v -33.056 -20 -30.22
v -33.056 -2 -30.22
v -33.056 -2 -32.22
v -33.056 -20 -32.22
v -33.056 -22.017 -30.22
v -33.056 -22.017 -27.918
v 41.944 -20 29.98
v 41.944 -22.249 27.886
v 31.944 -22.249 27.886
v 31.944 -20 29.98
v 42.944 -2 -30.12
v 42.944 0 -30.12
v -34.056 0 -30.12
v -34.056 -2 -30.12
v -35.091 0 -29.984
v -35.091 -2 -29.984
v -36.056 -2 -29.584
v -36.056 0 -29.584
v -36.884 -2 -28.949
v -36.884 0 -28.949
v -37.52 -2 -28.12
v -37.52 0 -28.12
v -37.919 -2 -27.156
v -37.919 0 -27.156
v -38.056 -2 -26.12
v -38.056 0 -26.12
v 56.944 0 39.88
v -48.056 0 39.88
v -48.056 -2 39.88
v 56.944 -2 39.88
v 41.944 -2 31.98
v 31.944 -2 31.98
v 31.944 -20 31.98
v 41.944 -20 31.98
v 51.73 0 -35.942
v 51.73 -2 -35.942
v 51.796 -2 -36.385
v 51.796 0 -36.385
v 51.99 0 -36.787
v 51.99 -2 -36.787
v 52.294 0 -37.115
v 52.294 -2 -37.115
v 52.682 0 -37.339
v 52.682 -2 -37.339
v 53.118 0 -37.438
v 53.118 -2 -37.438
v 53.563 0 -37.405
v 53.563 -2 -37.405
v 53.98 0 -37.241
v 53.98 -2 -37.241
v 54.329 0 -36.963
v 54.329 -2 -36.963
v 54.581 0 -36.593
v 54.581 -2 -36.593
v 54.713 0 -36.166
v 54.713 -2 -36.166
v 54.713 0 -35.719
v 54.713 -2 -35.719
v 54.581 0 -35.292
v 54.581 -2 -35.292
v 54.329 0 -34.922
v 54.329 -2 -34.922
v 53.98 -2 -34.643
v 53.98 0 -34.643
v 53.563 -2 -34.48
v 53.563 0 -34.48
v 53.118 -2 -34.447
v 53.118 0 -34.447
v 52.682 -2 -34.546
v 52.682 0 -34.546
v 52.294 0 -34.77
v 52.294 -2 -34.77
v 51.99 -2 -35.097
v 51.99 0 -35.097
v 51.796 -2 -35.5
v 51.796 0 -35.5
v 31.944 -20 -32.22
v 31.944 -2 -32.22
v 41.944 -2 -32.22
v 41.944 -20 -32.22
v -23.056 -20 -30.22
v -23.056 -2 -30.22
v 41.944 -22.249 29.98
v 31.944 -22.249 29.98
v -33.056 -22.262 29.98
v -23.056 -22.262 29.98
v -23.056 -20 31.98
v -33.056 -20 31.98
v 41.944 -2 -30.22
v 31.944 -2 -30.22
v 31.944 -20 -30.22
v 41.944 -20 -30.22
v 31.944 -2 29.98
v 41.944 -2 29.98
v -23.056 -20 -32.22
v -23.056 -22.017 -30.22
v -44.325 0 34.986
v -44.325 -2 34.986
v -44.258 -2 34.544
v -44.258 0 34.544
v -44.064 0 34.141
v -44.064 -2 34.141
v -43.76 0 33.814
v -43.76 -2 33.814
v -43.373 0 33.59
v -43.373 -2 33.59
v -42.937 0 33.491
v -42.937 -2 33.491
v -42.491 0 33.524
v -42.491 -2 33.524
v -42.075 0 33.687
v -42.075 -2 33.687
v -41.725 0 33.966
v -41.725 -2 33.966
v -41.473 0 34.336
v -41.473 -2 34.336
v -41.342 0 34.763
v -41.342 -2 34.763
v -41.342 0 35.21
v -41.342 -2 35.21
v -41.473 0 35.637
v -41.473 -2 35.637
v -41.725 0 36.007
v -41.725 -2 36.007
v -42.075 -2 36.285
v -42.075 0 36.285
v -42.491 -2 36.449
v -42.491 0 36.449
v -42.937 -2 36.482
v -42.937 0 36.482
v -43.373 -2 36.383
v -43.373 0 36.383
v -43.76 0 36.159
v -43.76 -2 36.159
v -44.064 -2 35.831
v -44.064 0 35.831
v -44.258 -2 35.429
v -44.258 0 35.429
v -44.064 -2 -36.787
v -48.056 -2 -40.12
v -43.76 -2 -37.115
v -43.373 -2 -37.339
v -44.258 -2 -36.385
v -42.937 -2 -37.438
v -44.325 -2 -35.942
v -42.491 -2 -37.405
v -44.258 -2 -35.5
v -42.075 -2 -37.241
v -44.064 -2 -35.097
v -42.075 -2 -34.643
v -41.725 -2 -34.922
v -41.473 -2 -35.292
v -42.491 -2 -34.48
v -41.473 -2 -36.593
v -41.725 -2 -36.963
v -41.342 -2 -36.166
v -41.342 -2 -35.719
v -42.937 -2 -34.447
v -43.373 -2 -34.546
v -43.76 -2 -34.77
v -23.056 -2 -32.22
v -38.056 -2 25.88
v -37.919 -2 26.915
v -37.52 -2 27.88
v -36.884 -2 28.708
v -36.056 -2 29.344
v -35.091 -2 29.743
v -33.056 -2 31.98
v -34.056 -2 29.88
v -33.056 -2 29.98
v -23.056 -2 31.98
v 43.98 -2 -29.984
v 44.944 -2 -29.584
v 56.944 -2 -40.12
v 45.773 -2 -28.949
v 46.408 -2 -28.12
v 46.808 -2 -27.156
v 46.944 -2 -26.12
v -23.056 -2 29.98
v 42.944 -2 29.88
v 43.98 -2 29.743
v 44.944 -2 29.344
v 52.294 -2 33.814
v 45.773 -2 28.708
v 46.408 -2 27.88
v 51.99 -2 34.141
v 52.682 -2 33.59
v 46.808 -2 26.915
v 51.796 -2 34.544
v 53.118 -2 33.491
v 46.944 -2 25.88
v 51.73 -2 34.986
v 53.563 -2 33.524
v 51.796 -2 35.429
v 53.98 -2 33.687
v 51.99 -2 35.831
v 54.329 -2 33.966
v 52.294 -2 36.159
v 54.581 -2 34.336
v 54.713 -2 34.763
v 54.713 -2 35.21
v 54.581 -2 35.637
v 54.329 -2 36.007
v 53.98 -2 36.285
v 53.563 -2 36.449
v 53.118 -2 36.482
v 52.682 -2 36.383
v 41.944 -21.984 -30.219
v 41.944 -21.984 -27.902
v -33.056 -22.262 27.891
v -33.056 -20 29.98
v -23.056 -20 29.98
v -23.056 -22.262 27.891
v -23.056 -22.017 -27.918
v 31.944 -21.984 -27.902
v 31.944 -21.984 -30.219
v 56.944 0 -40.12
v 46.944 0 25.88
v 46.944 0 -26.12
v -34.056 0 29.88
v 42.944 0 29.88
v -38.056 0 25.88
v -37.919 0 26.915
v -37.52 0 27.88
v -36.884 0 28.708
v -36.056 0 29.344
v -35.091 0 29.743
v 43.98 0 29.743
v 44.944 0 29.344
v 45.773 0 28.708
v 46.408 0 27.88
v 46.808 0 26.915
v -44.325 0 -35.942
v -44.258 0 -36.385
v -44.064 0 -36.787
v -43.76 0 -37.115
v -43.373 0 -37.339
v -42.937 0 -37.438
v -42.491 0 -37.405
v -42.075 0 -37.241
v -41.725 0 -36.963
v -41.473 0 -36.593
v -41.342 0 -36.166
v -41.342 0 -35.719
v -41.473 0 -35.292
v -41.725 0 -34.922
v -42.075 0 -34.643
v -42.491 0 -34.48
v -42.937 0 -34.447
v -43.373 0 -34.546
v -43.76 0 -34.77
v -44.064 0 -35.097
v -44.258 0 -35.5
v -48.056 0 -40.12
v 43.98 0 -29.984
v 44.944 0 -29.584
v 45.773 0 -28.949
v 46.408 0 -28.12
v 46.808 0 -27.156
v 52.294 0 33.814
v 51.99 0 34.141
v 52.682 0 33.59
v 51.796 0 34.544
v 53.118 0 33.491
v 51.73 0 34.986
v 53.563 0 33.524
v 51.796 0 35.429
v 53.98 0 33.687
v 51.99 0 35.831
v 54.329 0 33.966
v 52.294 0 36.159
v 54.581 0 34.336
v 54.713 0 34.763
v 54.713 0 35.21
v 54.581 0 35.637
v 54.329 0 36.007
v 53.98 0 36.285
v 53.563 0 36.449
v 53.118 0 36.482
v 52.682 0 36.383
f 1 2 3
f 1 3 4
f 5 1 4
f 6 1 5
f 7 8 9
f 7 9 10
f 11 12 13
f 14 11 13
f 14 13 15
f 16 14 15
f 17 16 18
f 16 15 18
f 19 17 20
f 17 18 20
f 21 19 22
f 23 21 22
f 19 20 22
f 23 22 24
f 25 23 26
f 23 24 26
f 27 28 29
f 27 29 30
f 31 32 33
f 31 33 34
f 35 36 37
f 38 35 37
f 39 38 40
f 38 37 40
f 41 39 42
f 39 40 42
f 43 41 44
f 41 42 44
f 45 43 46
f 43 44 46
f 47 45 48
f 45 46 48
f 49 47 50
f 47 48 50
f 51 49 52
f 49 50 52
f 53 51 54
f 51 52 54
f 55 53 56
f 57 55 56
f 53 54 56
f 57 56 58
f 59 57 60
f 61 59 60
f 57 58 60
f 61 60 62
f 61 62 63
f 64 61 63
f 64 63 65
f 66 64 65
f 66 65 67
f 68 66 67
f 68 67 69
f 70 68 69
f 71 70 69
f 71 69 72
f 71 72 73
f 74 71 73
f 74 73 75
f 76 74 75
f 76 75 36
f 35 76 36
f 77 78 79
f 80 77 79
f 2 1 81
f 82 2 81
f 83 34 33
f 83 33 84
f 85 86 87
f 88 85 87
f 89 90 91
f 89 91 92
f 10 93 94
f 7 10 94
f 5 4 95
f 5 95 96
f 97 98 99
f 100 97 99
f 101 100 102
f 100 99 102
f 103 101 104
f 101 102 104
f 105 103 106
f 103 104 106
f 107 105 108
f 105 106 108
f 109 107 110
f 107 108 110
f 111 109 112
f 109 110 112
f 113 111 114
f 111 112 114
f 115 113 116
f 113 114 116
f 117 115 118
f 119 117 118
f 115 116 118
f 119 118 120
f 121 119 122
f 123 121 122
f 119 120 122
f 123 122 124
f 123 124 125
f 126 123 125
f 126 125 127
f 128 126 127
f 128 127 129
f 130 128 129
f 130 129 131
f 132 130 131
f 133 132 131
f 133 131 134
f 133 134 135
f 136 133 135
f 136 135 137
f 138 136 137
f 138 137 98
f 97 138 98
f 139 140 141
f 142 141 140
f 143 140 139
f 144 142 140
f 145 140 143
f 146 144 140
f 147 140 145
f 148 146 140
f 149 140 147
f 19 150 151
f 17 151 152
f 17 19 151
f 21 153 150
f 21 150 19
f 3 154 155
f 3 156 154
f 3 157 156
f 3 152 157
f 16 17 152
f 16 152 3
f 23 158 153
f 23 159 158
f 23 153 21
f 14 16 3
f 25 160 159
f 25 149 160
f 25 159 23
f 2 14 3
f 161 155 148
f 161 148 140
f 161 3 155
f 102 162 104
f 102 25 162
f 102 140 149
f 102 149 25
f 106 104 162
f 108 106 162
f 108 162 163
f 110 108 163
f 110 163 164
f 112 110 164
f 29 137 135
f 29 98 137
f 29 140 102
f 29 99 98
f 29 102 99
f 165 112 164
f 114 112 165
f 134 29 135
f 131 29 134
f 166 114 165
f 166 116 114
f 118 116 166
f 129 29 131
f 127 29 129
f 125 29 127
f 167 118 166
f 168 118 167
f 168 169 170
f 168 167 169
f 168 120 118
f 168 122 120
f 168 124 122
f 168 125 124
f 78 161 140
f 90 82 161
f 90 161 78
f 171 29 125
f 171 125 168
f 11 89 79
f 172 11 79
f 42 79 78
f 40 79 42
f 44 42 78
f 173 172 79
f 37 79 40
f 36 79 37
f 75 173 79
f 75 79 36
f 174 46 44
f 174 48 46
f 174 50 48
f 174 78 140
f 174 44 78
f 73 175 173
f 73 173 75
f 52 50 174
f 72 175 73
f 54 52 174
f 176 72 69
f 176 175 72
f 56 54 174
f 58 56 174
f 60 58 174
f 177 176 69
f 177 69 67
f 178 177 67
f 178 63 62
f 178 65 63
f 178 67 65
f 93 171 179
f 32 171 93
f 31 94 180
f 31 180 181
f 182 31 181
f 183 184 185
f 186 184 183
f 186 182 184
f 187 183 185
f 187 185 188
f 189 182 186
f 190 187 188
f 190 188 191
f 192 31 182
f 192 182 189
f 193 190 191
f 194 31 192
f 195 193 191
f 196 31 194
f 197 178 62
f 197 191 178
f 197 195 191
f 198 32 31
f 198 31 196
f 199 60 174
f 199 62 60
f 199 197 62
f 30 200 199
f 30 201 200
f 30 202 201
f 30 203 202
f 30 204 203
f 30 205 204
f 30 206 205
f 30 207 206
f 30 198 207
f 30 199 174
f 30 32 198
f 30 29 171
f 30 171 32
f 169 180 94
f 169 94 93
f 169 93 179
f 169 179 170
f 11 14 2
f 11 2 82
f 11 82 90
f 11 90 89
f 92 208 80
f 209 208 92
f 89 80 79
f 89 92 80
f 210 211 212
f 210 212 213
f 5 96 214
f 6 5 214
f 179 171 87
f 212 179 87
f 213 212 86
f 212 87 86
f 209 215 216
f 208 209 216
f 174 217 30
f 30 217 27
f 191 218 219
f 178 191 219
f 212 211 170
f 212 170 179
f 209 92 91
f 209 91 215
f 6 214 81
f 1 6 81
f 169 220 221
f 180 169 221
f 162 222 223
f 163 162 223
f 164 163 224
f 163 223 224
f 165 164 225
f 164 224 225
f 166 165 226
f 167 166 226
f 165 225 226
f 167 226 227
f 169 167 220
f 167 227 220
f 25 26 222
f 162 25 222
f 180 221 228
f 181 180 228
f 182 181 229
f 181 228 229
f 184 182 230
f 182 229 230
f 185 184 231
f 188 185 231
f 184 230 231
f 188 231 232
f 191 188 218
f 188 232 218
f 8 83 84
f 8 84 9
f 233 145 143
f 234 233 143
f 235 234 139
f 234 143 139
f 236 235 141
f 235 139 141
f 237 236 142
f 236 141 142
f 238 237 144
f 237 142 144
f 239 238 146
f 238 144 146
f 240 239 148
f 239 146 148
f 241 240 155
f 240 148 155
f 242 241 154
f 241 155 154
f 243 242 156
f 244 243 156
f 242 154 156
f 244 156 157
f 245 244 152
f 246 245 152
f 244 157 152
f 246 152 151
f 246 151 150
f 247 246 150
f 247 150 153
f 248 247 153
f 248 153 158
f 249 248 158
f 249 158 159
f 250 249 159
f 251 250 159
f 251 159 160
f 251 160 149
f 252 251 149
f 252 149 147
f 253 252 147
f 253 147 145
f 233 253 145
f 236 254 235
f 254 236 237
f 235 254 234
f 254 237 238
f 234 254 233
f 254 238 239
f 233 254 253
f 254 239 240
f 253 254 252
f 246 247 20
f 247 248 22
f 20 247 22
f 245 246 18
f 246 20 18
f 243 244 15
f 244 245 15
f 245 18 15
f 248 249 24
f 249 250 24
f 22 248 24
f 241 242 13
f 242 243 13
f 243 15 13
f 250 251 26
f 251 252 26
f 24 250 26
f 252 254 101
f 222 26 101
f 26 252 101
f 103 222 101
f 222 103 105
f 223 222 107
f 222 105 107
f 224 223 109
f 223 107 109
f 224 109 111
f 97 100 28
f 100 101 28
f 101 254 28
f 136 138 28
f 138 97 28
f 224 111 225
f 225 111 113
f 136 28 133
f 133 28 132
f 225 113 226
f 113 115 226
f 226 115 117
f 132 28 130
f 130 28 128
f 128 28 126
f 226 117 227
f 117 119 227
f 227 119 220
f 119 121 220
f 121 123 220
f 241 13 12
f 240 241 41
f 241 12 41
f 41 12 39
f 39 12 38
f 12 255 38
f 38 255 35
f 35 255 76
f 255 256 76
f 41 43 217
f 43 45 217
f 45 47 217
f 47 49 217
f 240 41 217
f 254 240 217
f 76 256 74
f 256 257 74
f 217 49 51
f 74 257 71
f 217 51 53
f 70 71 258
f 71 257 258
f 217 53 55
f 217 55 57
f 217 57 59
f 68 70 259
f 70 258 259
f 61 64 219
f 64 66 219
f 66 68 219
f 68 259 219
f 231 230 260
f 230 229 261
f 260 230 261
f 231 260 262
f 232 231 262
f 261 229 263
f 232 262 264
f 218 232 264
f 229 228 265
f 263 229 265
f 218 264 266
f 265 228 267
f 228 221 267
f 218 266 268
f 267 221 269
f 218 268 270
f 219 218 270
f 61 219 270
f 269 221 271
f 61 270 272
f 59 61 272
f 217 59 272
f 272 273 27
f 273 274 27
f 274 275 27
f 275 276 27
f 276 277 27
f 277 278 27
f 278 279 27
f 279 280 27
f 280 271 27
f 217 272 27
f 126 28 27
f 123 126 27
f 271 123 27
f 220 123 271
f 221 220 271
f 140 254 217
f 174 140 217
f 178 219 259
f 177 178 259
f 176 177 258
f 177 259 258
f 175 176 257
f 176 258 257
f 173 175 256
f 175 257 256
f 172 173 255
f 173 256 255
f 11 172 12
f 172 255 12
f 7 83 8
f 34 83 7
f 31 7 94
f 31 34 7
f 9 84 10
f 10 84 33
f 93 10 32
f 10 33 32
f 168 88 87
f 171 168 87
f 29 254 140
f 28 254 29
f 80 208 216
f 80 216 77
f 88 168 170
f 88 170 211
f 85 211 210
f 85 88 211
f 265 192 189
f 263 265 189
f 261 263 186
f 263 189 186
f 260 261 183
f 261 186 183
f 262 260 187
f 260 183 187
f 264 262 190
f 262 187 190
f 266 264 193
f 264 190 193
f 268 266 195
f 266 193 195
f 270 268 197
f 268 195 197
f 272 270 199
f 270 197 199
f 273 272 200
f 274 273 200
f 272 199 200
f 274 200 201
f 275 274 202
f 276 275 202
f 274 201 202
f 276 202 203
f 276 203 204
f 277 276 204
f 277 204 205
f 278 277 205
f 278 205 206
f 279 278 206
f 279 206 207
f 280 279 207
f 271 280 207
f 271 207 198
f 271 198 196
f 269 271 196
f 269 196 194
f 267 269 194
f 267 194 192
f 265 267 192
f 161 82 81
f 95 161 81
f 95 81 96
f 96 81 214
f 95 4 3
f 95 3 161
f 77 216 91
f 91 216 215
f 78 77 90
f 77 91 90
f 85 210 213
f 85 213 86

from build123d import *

# Parameters (mm, degrees)
F0_W      = 105
F0_H      = 80
F0_W_2    = 10
F0_H_2    = 2
F1_DEPTH  = 2
F2_D      = 3
F3_DEPTH  = 20
F5_DEPTH  = 10
F7_DEPTH  = 10
F9_DEPTH  = 10
F11_DEPTH = 10


with BuildPart() as f1:
    # F0 (on Front) → F1 (new body)
    with BuildSketch(Plane.XZ):
        with Locations((4.4443034394, -0.1203698614)):
            Rectangle(F0_W, F0_H)
        with Locations((-28.0556965606, -31.2203698614)):
            Rectangle(F0_W_2, F0_H_2, mode=Mode.SUBTRACT)
        with Locations((36.9443034394, -31.2203698614)):
            Rectangle(F0_W_2, F0_H_2, mode=Mode.SUBTRACT)
        with Locations((-28.0556965606, 30.9796301386)):
            Rectangle(F0_W_2, F0_H_2, mode=Mode.SUBTRACT)
        with BuildLine():
            ThreePointArc((-38.0556965606, 25.8796301386), (-36.8841236853, 28.7080572633), (-34.0556965606, 29.8796301386))
            Line((-34.0556965606, 29.8796301386), (42.9443034394, 29.8796301386))
            ThreePointArc((42.9443034394, 29.8796301386), (45.7727305642, 28.7080572633), (46.9443034394, 25.8796301386))
            Line((46.9443034394, 25.8796301386), (46.9443034394, -26.1203698614))
            ThreePointArc((46.9443034394, -26.1203698614), (45.7727305642, -28.9487969862), (42.9443034394, -30.1203698614))
            Line((42.9443034394, -30.1203698614), (-34.0556965606, -30.1203698614))
            ThreePointArc((-34.0556965606, -30.1203698614), (-36.8841236853, -28.9487969862), (-38.0556965606, -26.1203698614))
            Line((-38.0556965606, -26.1203698614), (-38.0556965606, 25.8796301386))
        make_face(mode=Mode.SUBTRACT)
        with Locations((36.9443034394, 30.9796301386)):
            Rectangle(F0_W_2, F0_H_2, mode=Mode.SUBTRACT)
    extrude(amount=F1_DEPTH)

    # F2 (through all)
    with Locations(Plane(origin=(0, 0, 0), x_dir=(1, 0, 0), z_dir=(0, 1, 0))):
        with Locations((-42.8249463439, -34.9864512682), (-42.8249463439, 35.9423682094), (53.229637444, 35.9423682094), (53.229637444, -34.9864512682)):
            Hole(F2_D / 2)

    # F0 (on Front) → F3 (join)
    with BuildSketch(Plane.XZ):
        with Locations((-28.0556965606, 30.9796301386)):
            Rectangle(F0_W_2, F0_H_2)
        with Locations((36.9443034394, 30.9796301386)):
            Rectangle(F0_W_2, F0_H_2)
        with Locations((-28.0556965606, -31.2203698614)):
            Rectangle(F0_W_2, F0_H_2)
        with Locations((36.9443034394, -31.2203698614)):
            Rectangle(F0_W_2, F0_H_2)
    extrude(amount=F3_DEPTH)

    # F4 (on face) → F5 (join)
    with BuildSketch(Plane(origin=(-33.0556965606, 0, 0), x_dir=(0, -1, 0), z_dir=(-1, 0, 0))):
        Polygon((20, 31.9796301386), (20, 29.9796301386), (22.2622127322, 27.8908082008), (22.2622127322, 29.9796301386), align=None)
    extrude(amount=-F5_DEPTH)

    # F6 (on face) → F7 (join)
    with BuildSketch(Plane(origin=(-33.0556965606, 0, 0), x_dir=(0, -1, 0), z_dir=(-1, 0, 0))):
        Polygon((22.0167362937, -27.9179245889), (20, -30.2203698614), (20, -32.2203698614), (22.0167362937, -30.2203698614), align=None)
    extrude(amount=-F7_DEPTH)

    # F8 (on face) → F9 (join)
    with BuildSketch(Plane.YZ.offset(41.9443034394)):
        Polygon((-22.2486329954, 27.8861031592), (-20, 29.9796301386), (-20, 31.9796301386), (-22.2486329954, 29.9796301386), align=None)
    extrude(amount=-F9_DEPTH)

    # F10 (on face) → F11 (join)
    with BuildSketch(Plane.YZ.offset(41.9443034394)):
        Polygon((-21.9842810184, -30.2190438569), (-20, -32.2203698614), (-20, -30.2203698614), (-21.9842810184, -27.9021759242), align=None)
    extrude(amount=-F11_DEPTH)


solid = f1.part
